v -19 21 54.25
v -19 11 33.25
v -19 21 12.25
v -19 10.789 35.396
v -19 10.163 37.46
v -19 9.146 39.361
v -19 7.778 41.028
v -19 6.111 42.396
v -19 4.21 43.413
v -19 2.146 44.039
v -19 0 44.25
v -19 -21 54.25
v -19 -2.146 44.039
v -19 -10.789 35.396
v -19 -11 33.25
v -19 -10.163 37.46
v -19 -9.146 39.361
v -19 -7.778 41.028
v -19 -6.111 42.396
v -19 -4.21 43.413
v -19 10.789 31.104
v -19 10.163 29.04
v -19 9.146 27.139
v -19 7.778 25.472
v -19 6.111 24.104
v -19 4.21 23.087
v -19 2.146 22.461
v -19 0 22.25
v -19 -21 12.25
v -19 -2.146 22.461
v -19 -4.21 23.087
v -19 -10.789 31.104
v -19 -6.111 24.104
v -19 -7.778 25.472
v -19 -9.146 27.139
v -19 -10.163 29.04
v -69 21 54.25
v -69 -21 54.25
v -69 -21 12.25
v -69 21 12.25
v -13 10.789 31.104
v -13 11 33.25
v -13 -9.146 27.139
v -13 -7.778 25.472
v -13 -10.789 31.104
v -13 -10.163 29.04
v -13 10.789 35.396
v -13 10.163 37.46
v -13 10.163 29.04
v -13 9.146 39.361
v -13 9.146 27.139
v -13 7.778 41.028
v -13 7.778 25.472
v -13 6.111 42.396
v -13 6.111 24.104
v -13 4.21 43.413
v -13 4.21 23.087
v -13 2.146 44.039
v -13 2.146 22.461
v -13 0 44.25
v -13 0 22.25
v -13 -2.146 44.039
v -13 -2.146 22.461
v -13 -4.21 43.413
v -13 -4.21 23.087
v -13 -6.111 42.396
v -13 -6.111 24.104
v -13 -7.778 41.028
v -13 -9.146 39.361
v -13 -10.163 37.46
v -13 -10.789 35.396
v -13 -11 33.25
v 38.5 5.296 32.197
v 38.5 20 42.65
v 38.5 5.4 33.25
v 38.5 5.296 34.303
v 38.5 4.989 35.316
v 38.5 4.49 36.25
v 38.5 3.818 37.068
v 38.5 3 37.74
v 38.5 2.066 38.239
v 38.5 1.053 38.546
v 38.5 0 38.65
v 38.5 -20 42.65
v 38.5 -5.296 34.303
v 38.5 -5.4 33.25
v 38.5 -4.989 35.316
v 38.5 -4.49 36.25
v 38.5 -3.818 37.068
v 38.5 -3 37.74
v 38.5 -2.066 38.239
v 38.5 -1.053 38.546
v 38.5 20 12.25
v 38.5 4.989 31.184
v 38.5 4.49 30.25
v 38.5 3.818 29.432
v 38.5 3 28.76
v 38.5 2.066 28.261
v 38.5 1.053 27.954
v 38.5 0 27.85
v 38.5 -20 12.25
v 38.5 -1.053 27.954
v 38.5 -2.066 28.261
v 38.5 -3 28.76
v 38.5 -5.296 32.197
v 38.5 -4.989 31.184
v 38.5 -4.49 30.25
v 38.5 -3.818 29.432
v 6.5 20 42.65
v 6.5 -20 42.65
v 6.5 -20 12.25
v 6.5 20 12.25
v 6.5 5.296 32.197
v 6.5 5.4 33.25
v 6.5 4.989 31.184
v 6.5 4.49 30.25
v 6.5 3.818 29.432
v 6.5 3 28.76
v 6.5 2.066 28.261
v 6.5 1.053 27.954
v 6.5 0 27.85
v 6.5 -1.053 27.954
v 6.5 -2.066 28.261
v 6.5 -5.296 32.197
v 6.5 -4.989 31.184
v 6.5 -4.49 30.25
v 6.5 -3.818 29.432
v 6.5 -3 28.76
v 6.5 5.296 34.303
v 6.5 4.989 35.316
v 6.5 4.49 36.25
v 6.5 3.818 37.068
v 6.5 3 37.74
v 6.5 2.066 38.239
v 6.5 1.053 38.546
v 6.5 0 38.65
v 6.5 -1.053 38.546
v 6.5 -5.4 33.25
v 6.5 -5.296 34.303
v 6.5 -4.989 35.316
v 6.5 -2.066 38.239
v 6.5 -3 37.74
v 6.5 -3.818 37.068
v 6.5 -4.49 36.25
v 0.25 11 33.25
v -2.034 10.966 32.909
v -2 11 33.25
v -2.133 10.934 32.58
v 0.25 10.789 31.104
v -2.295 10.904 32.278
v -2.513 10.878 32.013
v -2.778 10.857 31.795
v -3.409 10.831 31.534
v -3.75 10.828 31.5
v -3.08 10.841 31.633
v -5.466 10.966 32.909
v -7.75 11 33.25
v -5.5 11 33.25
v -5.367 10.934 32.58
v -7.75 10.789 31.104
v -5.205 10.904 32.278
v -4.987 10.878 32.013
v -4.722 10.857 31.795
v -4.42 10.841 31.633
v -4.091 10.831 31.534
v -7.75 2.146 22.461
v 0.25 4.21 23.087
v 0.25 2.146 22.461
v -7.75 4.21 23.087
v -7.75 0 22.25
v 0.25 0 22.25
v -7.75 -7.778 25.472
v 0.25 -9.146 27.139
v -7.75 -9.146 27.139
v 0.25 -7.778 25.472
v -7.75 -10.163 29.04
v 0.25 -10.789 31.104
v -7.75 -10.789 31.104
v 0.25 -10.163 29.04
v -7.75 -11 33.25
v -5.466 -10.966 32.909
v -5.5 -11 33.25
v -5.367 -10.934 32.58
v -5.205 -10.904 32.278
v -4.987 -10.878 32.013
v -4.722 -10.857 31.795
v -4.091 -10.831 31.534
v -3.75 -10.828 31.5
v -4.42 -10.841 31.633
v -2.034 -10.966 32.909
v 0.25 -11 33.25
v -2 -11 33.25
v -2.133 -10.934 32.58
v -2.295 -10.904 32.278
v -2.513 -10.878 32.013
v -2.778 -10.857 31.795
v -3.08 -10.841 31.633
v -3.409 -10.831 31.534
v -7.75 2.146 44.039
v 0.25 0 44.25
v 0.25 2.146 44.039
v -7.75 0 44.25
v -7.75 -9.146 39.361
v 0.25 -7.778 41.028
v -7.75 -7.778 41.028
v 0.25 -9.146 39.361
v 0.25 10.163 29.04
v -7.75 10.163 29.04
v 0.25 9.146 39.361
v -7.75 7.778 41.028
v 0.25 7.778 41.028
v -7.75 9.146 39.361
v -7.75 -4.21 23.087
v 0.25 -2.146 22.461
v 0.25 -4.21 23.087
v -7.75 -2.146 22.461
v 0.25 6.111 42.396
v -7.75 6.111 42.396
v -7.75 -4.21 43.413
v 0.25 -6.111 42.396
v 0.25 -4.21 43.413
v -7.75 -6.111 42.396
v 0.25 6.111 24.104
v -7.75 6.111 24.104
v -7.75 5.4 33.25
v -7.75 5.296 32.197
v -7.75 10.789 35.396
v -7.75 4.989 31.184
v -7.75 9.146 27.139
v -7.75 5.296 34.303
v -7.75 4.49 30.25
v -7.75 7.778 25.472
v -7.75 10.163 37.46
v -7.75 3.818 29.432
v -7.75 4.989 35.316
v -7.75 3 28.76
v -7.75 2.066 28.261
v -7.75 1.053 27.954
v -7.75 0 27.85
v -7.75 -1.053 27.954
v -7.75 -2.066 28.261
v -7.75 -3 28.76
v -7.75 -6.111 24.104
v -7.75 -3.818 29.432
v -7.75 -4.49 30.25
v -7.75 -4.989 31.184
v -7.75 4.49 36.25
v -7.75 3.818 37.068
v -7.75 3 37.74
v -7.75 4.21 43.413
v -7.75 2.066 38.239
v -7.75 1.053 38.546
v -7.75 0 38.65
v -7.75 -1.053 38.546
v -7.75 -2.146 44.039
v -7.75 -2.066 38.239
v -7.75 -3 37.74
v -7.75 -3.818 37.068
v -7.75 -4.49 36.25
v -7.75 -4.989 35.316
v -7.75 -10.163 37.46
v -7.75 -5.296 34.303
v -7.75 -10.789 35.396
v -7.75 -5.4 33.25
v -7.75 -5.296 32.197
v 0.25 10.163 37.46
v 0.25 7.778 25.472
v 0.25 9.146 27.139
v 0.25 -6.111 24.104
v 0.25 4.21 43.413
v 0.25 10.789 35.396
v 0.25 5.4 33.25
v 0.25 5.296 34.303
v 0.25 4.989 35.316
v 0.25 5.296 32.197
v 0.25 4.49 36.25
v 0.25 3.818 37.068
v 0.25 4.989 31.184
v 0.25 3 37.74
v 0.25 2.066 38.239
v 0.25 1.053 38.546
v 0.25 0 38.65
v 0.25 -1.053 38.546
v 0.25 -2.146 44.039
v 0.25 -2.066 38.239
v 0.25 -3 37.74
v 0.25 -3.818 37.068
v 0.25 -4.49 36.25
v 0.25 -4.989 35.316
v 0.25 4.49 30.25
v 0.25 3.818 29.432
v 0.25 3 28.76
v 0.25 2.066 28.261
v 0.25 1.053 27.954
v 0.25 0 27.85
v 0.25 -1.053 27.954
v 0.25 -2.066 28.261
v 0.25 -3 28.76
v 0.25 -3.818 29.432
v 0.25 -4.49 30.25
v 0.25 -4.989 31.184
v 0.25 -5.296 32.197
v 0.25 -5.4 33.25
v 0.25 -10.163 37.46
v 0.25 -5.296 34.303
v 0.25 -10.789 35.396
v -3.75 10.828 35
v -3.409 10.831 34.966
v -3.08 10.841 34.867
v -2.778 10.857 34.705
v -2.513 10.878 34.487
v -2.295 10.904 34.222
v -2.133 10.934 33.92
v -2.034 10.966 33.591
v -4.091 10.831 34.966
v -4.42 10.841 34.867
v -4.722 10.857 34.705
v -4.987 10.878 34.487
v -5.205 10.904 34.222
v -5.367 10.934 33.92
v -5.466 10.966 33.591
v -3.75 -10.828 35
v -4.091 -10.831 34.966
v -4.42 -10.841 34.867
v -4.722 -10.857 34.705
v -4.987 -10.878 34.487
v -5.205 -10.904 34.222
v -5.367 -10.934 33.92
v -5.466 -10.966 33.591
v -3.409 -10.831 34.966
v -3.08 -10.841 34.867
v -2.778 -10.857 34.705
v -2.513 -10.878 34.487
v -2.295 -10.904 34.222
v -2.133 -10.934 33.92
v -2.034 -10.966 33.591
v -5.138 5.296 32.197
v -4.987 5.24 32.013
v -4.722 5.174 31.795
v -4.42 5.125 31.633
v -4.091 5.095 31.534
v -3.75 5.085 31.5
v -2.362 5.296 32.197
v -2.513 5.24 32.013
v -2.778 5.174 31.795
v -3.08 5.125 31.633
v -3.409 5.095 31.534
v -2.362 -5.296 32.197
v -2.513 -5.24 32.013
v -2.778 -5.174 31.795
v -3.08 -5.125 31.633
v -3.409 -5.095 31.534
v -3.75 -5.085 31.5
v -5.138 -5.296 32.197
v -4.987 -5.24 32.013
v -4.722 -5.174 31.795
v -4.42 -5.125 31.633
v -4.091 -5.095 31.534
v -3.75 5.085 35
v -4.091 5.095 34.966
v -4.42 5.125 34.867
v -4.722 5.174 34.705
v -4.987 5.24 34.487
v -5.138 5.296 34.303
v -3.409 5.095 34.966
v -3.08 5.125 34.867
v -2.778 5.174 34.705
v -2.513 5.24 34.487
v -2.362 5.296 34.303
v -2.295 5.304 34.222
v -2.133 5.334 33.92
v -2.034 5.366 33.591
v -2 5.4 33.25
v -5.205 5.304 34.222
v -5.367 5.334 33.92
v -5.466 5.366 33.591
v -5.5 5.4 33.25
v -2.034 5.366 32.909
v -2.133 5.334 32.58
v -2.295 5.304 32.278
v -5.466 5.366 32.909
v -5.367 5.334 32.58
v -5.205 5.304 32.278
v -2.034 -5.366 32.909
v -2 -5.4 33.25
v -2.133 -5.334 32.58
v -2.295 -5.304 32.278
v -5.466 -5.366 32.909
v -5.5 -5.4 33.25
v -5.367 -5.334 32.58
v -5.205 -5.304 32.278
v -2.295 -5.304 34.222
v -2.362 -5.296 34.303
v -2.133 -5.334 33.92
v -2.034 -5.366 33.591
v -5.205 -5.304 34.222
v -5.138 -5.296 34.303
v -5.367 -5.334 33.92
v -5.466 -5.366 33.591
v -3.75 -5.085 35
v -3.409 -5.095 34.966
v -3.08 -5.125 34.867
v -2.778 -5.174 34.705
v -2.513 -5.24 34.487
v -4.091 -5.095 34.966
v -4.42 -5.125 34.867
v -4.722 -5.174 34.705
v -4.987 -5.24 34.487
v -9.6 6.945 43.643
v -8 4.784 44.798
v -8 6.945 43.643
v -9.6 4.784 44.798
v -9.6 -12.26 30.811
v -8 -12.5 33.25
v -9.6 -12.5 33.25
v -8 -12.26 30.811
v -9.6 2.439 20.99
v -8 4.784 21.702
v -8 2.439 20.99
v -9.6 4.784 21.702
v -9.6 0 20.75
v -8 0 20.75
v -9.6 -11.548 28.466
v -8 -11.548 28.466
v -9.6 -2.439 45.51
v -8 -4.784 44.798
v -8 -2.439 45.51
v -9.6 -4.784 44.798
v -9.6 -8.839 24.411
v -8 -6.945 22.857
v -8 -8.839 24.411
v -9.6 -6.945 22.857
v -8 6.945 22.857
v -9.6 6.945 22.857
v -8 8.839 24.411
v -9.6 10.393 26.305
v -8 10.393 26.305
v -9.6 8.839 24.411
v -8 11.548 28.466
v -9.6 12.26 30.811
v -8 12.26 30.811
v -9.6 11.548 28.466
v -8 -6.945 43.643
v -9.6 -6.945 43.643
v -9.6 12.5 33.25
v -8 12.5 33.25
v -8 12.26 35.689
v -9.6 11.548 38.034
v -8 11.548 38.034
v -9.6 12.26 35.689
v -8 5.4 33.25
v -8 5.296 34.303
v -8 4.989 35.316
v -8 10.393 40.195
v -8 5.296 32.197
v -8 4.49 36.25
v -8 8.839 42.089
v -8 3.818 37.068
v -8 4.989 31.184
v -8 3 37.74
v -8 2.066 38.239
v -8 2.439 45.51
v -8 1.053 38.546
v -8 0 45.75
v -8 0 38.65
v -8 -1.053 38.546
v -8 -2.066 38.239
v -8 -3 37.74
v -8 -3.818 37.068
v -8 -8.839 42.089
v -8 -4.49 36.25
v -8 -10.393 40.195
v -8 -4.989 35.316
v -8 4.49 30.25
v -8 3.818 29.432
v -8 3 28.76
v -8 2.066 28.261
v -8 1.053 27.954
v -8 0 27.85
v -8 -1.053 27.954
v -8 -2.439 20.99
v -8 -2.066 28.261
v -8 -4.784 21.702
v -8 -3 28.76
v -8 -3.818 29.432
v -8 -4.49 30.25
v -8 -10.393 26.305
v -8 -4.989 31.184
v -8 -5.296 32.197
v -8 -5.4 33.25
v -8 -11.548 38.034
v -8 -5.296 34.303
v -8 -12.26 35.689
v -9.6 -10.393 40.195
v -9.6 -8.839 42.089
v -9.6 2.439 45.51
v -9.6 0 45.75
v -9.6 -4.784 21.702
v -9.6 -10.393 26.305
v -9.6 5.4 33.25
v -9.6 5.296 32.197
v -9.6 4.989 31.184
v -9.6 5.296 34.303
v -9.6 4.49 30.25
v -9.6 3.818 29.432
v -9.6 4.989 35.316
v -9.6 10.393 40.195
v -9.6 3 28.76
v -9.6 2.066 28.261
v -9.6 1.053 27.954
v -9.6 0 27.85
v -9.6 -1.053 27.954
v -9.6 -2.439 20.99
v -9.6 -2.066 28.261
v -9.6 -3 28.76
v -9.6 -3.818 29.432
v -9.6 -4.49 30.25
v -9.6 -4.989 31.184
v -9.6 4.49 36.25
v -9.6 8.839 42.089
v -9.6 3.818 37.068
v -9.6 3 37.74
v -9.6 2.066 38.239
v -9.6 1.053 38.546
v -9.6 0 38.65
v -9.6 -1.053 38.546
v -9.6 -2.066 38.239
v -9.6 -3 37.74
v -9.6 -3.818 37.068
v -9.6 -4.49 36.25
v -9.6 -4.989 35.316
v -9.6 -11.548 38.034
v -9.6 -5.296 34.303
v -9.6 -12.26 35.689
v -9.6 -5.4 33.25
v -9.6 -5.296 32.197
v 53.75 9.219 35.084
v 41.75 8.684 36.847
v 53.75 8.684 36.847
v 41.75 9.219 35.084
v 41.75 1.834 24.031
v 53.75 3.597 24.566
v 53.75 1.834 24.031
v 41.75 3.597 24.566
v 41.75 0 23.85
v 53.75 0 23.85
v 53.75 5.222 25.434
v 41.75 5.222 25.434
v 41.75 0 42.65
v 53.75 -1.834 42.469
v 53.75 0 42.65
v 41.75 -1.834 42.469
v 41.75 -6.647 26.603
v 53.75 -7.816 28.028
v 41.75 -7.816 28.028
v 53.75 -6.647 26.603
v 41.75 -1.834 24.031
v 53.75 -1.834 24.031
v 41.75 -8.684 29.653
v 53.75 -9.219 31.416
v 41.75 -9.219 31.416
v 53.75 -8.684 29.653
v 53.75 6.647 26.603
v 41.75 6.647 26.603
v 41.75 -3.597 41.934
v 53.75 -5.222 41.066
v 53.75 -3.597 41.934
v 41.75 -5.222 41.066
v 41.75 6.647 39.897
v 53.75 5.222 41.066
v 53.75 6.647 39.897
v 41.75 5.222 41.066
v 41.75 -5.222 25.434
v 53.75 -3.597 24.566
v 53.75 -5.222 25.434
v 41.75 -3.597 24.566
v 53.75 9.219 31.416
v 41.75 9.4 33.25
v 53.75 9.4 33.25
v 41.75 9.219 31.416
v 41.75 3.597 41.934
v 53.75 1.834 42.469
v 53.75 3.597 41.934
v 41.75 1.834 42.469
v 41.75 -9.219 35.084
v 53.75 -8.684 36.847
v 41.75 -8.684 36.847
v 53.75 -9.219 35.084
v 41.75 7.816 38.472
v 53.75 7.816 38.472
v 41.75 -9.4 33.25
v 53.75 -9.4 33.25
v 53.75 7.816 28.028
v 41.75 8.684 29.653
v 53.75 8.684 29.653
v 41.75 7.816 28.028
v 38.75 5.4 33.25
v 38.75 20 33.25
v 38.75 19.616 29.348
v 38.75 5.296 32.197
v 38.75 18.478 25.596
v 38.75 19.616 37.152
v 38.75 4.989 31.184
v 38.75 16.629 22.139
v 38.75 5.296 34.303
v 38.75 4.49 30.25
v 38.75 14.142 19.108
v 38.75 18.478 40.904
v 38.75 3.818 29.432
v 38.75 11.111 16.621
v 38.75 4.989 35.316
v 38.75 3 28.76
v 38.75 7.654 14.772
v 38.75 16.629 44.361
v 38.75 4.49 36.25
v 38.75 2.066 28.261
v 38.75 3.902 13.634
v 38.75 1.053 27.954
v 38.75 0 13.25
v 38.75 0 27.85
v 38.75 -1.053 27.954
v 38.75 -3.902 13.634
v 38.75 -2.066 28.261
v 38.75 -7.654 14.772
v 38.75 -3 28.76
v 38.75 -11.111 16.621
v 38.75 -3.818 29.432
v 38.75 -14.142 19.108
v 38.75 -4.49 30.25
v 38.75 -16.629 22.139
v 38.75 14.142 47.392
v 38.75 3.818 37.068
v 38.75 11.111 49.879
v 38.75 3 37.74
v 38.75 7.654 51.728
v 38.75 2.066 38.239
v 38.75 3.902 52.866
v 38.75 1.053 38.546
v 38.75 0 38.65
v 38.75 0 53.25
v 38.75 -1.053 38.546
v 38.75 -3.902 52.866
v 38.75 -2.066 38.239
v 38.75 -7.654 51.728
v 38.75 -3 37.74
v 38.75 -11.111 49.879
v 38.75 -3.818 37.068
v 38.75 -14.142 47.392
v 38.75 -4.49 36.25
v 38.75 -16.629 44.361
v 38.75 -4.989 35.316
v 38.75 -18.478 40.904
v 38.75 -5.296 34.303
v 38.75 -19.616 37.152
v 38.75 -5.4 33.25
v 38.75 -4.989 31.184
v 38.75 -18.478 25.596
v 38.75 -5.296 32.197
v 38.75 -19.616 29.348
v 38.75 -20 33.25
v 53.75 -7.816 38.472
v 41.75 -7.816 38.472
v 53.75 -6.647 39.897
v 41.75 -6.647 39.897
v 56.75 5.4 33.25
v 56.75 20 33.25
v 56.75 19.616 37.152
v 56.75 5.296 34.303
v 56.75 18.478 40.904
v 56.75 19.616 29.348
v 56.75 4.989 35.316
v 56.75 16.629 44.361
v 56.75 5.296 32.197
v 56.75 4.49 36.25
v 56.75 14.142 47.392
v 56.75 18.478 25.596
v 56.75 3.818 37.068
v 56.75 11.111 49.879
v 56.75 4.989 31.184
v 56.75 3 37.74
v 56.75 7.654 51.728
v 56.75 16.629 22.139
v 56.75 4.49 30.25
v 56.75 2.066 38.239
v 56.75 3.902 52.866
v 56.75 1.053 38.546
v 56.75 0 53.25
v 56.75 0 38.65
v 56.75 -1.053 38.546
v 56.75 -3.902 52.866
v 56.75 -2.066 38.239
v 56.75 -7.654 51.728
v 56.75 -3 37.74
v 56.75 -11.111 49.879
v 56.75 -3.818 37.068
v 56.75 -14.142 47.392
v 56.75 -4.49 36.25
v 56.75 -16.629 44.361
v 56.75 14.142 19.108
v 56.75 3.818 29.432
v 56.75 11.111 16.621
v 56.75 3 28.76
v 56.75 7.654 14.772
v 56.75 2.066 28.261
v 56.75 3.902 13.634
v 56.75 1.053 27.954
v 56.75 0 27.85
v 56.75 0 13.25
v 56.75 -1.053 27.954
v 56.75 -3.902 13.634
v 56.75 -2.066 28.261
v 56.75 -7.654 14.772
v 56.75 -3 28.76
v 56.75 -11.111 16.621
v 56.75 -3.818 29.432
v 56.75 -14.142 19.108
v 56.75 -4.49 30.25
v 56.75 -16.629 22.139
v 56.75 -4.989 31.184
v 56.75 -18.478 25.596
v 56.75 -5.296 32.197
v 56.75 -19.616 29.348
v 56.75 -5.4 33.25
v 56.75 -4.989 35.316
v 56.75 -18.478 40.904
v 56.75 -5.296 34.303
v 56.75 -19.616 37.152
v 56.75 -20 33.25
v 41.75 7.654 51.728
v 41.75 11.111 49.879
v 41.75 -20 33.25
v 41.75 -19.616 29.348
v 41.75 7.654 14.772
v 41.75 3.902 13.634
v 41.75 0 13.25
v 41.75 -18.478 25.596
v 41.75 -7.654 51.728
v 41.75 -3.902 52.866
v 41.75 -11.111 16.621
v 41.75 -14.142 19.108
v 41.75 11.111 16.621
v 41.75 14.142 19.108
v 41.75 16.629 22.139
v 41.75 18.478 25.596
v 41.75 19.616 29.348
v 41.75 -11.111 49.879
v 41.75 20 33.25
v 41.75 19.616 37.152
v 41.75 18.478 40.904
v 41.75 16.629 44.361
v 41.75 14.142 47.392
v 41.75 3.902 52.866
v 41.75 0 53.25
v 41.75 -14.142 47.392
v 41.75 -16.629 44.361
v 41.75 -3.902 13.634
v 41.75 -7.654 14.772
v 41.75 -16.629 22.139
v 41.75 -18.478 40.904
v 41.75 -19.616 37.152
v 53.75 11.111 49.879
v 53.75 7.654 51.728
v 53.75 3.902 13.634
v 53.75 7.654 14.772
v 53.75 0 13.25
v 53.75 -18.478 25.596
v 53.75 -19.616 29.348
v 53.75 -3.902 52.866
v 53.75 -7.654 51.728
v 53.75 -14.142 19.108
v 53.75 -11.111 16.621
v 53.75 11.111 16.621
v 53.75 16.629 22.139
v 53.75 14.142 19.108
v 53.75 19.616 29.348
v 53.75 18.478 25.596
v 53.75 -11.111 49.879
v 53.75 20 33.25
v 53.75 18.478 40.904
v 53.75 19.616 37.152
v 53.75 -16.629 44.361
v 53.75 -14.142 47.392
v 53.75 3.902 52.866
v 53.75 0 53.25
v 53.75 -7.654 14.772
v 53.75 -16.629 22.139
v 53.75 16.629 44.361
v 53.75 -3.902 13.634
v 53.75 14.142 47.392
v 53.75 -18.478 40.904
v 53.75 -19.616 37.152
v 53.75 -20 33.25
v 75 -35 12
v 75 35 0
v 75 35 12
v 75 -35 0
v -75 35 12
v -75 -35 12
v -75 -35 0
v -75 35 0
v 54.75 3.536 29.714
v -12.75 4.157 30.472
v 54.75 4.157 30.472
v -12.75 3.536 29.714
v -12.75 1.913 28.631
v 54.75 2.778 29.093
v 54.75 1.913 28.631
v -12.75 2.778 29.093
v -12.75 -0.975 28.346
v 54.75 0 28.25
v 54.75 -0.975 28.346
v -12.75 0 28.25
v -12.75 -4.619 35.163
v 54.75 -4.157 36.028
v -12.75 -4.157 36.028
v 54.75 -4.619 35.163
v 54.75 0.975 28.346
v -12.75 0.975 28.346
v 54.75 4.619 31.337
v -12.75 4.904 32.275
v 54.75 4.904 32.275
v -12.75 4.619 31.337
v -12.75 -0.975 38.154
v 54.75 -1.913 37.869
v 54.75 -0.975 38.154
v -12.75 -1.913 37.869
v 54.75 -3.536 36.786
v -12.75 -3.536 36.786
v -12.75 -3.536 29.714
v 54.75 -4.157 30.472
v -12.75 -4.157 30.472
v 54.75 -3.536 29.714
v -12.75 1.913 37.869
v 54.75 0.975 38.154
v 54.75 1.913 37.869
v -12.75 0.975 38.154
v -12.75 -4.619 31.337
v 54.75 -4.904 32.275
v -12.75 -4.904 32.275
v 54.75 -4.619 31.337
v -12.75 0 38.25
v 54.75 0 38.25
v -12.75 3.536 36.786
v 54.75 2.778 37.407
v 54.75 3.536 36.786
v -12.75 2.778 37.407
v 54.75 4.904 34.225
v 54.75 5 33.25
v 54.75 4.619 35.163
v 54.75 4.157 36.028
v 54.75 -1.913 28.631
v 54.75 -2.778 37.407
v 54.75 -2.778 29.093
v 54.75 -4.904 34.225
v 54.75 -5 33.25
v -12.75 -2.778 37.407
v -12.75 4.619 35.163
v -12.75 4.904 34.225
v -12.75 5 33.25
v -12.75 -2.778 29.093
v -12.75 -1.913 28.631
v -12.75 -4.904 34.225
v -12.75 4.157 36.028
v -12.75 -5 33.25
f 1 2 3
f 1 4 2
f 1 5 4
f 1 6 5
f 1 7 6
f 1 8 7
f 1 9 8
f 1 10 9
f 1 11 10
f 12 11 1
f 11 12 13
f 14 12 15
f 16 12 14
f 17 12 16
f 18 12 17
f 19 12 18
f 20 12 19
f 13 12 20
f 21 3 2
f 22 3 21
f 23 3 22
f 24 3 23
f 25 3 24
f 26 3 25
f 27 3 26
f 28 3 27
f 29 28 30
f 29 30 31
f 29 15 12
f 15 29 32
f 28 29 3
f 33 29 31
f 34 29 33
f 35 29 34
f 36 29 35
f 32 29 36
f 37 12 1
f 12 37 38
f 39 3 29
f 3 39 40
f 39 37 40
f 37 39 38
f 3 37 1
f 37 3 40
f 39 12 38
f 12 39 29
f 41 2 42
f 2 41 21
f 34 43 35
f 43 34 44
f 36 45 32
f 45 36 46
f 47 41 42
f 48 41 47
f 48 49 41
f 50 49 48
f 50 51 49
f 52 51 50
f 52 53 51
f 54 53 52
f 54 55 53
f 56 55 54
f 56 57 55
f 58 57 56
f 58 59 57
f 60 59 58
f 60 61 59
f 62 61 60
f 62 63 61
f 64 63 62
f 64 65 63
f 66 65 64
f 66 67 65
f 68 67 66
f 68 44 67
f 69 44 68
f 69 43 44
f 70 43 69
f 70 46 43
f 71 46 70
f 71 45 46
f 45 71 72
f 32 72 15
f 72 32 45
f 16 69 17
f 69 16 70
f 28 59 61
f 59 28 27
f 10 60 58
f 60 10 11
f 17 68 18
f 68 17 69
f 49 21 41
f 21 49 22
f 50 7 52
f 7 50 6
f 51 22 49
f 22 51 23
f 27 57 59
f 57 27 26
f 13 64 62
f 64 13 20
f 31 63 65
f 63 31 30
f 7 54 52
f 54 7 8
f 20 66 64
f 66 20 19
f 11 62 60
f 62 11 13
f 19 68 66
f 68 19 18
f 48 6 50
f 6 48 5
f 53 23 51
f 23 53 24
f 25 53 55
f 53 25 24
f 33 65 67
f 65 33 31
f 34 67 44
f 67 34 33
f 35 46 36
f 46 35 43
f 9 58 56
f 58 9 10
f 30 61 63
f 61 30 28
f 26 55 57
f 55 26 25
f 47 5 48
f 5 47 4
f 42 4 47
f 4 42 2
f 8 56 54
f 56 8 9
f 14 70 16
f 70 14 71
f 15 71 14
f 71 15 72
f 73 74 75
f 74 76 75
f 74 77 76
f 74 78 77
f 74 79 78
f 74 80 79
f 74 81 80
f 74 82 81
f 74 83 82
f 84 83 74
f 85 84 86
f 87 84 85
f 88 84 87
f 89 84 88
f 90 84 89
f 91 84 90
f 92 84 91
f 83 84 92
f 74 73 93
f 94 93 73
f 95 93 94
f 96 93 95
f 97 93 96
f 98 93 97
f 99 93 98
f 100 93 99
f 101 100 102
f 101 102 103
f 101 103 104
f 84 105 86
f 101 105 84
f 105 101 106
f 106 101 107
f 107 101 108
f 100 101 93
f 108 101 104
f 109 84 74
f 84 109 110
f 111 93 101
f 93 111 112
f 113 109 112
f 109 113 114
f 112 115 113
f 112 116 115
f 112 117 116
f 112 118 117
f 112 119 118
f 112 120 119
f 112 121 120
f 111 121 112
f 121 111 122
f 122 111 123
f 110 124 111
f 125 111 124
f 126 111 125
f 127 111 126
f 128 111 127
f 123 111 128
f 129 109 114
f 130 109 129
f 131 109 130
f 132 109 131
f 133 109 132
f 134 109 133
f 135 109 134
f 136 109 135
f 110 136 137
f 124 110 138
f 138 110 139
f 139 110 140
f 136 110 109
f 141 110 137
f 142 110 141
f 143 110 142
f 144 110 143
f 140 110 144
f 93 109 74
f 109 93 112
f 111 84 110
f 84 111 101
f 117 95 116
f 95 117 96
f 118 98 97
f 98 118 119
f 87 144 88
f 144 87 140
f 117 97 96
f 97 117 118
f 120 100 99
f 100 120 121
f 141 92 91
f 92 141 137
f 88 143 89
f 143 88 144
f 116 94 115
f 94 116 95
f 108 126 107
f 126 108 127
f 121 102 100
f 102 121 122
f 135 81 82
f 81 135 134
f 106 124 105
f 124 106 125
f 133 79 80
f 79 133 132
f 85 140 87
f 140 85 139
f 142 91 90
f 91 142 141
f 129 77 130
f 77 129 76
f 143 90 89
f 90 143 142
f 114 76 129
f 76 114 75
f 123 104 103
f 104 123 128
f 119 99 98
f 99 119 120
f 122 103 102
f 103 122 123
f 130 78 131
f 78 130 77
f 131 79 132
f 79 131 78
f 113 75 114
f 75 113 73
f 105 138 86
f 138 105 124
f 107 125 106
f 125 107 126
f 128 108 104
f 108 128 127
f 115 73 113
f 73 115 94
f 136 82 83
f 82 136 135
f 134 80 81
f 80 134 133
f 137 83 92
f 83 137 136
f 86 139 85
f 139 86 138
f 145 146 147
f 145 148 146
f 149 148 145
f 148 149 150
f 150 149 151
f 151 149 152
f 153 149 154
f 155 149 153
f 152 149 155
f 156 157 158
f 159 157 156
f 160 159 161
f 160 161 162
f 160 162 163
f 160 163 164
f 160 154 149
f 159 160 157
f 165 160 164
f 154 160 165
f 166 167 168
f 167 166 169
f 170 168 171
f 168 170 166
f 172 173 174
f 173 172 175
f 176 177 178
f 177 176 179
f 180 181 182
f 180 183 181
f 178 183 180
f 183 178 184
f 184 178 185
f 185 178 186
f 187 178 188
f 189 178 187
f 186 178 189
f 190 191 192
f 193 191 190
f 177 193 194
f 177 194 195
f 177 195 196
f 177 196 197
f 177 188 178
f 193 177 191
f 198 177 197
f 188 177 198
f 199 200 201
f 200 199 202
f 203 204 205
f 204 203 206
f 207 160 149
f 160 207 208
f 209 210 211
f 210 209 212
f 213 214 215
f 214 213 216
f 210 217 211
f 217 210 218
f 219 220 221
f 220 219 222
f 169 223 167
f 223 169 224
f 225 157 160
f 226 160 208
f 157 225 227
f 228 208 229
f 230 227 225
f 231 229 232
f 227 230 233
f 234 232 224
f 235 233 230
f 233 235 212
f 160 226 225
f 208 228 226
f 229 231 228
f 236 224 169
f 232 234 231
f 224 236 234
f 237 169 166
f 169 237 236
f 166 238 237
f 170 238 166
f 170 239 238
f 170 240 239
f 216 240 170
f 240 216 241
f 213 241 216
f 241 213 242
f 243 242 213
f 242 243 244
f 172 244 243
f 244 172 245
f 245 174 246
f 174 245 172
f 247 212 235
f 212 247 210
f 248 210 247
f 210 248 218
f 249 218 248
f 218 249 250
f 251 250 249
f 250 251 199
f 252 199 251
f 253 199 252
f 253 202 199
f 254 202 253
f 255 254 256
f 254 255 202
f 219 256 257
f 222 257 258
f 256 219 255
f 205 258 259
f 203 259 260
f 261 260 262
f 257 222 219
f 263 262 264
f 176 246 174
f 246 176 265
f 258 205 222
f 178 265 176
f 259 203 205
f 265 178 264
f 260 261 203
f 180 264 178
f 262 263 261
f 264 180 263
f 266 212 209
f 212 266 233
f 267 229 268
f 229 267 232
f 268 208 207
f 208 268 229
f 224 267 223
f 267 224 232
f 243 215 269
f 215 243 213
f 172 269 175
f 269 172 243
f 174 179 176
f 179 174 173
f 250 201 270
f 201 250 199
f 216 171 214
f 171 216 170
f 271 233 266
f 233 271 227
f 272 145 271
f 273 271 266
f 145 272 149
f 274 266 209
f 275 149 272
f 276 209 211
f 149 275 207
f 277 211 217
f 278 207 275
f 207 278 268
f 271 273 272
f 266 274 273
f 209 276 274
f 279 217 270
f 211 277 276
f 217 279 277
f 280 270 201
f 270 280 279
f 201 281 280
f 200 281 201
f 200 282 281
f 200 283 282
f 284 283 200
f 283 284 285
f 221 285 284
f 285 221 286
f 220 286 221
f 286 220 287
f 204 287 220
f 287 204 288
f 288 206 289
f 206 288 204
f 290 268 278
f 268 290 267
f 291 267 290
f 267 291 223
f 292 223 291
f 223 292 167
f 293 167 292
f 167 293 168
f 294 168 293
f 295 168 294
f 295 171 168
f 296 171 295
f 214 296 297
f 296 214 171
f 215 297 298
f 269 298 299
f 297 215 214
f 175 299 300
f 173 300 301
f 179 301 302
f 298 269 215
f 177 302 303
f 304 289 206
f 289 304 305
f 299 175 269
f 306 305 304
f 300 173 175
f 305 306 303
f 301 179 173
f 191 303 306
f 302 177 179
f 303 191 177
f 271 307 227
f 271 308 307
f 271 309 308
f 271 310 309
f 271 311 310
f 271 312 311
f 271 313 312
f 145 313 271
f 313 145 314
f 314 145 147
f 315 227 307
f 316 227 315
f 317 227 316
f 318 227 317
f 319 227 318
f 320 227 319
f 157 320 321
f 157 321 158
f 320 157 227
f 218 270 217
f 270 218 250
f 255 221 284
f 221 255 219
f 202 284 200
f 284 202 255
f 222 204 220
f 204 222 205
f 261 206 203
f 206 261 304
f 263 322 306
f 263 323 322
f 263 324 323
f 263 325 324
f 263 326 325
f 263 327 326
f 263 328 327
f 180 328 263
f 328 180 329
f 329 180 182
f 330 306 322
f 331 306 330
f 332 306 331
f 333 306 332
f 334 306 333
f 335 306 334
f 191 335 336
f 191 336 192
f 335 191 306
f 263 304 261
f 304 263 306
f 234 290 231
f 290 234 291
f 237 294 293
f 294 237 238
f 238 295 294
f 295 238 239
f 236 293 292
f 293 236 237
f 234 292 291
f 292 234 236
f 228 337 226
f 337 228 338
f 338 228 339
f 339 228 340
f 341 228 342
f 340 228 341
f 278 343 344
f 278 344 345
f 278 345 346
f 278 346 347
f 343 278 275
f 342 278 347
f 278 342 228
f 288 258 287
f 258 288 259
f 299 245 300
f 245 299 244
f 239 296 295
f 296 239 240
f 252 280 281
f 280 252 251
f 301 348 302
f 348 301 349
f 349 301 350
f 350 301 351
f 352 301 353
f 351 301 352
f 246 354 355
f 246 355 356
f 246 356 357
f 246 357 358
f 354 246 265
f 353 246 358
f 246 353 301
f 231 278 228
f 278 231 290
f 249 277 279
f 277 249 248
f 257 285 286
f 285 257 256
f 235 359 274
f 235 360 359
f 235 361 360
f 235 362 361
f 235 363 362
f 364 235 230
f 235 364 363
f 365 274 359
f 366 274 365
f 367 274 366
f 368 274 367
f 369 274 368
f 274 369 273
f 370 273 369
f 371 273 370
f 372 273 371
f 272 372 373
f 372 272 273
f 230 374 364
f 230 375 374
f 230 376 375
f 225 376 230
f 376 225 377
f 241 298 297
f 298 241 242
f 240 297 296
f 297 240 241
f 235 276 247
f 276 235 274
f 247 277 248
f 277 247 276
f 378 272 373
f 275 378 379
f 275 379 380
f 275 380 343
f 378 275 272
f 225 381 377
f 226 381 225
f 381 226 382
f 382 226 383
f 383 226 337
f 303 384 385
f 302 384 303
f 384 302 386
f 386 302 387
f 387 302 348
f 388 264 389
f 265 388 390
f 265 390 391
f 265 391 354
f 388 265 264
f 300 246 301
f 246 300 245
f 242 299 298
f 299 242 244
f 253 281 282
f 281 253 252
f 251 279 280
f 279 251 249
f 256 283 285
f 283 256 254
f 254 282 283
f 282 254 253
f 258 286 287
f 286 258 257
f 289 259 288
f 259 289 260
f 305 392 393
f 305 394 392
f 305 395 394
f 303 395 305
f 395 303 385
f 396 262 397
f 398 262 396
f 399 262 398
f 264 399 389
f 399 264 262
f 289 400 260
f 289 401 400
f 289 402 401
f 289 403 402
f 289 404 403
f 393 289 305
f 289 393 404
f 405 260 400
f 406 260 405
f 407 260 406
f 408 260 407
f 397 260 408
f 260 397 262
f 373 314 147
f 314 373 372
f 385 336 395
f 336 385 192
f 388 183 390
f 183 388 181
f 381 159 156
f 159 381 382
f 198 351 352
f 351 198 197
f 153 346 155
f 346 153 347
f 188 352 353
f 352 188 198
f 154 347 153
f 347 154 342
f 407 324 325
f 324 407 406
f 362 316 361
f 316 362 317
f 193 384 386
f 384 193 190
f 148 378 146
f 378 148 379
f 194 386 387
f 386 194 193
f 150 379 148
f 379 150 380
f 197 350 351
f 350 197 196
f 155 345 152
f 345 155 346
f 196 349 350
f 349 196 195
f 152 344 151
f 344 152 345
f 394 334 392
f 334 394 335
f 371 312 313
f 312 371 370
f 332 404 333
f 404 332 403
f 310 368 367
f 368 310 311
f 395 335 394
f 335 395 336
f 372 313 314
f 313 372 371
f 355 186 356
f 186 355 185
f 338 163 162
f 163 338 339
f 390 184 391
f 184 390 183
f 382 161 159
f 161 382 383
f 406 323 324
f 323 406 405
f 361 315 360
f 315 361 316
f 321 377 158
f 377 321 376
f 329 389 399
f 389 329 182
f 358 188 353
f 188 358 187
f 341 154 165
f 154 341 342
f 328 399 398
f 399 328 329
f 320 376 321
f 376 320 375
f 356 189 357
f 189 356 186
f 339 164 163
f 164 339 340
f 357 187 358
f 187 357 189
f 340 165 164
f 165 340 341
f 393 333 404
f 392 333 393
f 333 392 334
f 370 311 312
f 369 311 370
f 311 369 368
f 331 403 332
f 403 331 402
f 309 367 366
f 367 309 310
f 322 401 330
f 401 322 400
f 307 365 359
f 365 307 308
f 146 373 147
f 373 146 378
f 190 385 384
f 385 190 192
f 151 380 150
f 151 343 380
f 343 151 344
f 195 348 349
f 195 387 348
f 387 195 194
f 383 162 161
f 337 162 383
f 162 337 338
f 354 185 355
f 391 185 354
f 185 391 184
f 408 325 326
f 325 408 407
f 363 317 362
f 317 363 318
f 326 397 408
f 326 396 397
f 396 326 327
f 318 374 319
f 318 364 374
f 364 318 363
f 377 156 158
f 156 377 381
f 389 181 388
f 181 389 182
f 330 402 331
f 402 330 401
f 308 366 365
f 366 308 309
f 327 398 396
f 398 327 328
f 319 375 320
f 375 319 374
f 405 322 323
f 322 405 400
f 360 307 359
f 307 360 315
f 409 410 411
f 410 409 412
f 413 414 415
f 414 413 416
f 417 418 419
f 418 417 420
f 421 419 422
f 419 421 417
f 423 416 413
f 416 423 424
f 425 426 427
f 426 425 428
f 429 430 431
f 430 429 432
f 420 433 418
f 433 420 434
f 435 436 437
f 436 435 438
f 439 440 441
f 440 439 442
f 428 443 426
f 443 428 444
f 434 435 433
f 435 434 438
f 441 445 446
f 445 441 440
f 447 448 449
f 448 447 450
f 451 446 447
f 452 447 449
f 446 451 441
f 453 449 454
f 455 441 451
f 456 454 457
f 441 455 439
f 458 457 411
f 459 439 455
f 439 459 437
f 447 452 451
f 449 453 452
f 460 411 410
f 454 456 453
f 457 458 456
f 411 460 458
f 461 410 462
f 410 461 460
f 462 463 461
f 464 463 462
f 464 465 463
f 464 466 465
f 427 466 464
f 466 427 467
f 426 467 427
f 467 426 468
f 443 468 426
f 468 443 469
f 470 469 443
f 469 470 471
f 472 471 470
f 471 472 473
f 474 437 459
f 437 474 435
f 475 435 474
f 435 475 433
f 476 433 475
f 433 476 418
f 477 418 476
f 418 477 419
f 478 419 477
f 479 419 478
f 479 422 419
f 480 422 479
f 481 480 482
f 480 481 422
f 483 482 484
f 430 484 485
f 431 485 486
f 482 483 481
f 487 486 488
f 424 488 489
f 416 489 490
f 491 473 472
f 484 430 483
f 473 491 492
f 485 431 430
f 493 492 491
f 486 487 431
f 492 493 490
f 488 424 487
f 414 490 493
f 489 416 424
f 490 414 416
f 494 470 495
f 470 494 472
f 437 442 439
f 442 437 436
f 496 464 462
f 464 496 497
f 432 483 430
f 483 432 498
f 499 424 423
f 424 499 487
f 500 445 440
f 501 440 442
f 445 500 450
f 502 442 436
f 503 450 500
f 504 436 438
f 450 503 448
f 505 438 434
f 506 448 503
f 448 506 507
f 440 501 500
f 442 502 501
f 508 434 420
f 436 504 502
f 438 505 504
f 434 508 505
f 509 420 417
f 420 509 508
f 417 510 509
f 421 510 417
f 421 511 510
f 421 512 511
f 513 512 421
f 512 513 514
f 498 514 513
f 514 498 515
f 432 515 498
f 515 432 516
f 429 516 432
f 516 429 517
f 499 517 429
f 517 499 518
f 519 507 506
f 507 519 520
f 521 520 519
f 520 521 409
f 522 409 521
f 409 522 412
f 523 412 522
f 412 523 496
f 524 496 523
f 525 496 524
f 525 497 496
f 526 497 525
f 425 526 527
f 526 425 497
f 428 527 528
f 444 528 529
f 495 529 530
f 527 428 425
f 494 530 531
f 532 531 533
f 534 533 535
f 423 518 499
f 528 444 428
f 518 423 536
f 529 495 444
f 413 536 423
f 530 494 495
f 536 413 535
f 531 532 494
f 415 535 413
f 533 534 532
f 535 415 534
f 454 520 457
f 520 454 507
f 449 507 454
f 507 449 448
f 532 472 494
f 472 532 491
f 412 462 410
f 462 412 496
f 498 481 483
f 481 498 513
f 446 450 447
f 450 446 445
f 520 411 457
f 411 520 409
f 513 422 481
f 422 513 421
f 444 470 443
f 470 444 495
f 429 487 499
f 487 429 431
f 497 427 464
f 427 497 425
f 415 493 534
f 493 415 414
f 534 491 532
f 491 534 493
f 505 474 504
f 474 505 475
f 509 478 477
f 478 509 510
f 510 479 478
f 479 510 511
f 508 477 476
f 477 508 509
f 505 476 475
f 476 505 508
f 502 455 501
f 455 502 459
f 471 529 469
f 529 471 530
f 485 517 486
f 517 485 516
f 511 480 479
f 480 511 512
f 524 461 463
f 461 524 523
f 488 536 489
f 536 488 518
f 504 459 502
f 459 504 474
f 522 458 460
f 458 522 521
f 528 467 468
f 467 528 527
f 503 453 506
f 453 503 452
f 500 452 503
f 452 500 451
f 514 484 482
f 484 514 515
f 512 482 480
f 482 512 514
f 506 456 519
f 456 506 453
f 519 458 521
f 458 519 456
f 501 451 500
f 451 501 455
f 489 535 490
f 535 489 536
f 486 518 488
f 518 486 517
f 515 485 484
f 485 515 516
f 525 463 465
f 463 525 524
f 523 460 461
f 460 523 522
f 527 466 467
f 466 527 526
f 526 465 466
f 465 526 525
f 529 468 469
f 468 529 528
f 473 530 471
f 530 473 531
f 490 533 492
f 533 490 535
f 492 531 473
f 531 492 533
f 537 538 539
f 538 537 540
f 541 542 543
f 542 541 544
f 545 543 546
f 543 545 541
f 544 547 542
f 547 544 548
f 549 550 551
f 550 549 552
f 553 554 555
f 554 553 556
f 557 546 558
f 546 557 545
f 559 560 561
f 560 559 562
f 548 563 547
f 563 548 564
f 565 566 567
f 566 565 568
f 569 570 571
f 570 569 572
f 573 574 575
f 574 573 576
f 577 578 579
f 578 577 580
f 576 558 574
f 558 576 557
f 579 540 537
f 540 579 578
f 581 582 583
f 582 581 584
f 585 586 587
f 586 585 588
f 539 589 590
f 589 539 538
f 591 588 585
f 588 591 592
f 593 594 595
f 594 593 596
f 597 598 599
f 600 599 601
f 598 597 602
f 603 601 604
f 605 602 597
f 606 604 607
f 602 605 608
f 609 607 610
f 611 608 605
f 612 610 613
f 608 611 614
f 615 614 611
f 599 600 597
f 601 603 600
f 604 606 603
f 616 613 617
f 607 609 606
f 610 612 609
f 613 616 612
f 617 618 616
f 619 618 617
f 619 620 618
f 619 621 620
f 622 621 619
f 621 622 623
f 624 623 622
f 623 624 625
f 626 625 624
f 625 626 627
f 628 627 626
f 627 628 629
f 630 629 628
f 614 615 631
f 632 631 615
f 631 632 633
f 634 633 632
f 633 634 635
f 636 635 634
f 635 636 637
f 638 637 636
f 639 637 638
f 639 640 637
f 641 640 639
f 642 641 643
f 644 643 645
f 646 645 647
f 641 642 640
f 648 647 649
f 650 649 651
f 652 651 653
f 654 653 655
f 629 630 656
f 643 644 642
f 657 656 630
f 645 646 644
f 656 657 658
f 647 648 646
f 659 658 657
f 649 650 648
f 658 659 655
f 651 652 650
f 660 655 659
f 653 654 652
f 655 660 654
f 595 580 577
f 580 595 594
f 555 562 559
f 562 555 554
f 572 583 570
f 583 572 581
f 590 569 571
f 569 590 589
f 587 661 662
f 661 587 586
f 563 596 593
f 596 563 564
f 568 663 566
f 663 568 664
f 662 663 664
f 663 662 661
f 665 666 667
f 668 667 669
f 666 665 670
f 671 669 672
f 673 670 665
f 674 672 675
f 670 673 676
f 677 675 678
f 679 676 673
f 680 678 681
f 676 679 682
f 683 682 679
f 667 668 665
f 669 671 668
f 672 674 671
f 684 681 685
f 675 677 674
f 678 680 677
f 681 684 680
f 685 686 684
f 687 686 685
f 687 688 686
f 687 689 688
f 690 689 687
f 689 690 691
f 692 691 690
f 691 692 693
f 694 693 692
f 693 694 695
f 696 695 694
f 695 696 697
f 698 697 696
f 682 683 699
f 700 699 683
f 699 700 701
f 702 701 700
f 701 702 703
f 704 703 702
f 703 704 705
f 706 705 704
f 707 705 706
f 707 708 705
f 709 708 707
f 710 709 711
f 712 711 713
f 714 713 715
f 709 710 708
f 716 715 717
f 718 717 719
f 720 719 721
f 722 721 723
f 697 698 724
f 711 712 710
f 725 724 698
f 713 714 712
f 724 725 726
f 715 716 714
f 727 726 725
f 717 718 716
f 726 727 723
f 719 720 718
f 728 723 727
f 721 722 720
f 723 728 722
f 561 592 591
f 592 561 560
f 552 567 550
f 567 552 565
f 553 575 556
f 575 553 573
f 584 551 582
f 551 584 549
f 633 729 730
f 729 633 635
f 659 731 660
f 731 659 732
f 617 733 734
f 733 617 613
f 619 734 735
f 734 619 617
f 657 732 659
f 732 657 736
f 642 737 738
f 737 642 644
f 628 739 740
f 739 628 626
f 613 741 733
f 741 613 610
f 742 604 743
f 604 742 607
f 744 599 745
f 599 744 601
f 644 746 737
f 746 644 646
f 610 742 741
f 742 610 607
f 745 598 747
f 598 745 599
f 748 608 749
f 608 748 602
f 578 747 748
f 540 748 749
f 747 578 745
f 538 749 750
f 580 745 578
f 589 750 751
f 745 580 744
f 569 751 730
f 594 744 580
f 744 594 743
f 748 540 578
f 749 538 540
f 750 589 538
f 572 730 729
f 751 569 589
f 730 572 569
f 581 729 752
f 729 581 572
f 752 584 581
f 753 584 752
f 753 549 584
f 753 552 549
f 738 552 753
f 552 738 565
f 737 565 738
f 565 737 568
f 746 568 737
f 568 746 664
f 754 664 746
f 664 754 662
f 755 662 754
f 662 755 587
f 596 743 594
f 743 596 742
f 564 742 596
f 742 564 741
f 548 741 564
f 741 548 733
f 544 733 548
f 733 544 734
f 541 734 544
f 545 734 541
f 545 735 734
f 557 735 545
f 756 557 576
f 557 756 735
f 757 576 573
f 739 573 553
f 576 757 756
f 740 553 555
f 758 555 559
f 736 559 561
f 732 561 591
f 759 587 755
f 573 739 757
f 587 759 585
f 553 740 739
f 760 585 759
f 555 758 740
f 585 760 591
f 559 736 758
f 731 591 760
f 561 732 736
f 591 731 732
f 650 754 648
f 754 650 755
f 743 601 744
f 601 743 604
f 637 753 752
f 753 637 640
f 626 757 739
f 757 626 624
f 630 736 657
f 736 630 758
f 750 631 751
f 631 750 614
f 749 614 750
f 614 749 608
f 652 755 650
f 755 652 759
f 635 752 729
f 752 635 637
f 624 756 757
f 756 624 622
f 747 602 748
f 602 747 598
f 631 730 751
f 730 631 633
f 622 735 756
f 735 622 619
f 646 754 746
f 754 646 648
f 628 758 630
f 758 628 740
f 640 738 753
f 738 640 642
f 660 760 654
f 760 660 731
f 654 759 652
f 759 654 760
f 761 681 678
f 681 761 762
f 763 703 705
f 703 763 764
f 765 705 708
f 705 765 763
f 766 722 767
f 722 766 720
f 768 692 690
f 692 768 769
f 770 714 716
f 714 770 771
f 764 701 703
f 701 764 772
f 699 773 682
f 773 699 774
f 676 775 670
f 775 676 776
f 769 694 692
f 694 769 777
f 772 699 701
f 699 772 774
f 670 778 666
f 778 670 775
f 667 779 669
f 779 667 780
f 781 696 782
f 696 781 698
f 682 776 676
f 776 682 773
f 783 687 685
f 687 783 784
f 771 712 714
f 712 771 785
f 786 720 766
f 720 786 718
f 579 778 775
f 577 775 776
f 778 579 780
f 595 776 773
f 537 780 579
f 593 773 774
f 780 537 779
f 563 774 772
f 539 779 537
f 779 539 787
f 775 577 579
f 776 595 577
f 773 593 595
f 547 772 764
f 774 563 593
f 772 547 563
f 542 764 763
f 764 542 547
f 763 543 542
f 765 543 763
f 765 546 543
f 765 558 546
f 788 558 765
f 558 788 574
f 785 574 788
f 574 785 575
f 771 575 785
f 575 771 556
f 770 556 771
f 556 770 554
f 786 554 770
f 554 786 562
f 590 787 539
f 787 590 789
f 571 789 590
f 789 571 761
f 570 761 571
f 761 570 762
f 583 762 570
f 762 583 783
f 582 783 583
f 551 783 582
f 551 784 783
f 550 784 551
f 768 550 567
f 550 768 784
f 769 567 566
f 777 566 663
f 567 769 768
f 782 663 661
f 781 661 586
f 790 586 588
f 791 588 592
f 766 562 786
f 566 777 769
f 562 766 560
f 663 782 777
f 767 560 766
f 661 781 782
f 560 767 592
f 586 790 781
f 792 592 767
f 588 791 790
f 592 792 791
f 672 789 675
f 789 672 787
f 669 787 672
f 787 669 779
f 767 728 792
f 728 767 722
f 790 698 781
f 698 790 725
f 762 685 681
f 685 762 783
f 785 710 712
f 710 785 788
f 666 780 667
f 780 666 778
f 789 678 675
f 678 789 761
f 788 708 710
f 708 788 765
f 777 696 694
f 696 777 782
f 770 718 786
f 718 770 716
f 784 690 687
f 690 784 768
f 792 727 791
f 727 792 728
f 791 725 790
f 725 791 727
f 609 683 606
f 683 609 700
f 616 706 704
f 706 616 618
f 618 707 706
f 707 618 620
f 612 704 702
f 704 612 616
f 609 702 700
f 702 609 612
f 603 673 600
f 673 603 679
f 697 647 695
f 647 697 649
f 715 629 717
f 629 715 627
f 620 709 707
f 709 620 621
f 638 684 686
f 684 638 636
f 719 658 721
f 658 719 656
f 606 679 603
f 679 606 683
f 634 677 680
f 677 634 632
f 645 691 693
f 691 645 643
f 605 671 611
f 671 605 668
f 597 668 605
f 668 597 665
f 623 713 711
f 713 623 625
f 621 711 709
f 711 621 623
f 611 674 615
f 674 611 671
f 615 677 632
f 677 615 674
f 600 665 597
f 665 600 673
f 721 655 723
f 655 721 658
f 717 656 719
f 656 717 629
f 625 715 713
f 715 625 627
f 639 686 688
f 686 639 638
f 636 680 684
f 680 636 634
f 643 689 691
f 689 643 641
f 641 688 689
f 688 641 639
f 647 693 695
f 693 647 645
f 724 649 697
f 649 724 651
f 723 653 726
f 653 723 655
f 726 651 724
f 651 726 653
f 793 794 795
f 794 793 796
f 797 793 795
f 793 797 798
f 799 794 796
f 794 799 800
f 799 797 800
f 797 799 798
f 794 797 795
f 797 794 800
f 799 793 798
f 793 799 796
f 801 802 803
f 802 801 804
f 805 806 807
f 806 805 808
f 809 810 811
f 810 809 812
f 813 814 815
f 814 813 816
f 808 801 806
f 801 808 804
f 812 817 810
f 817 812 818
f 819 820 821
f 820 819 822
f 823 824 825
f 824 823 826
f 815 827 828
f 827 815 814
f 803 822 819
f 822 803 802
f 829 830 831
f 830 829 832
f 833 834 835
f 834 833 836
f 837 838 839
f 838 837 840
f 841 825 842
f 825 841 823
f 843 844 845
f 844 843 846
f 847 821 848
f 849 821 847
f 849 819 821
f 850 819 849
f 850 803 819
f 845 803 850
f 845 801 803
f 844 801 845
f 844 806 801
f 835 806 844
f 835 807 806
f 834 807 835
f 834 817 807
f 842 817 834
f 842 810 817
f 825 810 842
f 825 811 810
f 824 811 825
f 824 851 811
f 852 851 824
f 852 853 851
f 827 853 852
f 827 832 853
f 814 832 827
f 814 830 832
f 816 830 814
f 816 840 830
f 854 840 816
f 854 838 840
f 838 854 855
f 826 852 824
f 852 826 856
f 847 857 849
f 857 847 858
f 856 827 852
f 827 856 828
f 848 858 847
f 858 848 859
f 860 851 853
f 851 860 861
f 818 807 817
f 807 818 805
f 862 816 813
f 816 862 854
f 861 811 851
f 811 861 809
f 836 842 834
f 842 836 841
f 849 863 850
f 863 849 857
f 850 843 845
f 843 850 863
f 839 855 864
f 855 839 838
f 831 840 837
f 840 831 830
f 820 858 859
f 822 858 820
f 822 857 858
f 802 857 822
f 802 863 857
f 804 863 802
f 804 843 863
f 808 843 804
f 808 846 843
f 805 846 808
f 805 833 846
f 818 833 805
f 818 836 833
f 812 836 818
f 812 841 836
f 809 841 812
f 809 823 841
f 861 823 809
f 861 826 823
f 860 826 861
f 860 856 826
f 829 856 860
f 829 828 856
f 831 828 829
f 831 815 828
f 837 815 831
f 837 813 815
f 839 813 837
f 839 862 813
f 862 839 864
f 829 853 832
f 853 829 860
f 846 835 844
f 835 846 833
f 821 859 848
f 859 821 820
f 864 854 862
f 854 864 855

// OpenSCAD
$fn = 32;

// ------------------------------------------------------------------------
// Motor drive station: motor 50 x 42 mm, shaft d10, pulley d40
// Every part is its own module, assembly() places every instance.
// ------------------------------------------------------------------------

// --- part 1 ---
module station_bed() {
  difference() {
    translate([-75, -35, 0]) cube([150, 70, 12]);
  }
}

// --- part 2 ---
module drive_motor() {
  union() {
    translate([-25, -21, 0]) cube([50, 42, 42]);
    translate([28, 0, 21]) rotate([0, 90, 0]) cylinder(h = 6, d = 22, center = true);
  }
}

// --- part 3 ---
module pillow_block() {
  difference() {
    translate([-16, -20, 0]) cube([32, 40, 30.4]);
    translate([0, 0, 21]) rotate([0, 90, 0]) cylinder(h = 34, d = 10.8, center = true);
  }
}

// --- part 4 ---
module drive_shaft() {
  translate([0, 0, -33.75]) cylinder(h = 67.5, d = 10);
}

// --- part 5 ---
module shaft_collar() {
  difference() {
    cylinder(h = 8, d = 22);
    translate([0, 0, -1]) cylinder(h = 10, d = 10.8);
    translate([0, 0, 4]) rotate([90, 0, 0]) cylinder(h = 24, d = 3.5, center = true);
  }
}

// --- part 6 ---
module collar_washer() {
  difference() {
      translate([0, 0, 0]) cylinder(h = 1.6, d = 25);
      translate([0, 0, -1]) cylinder(h = 3.6, d = 10.8);
    }
}

// --- part 7 ---
module drive_pulley() {
  difference() {
    union() {
      cylinder(h = 18, d = 18.8);
      cylinder(h = 3, d = 40);
      translate([0, 0, 15]) cylinder(h = 3, d = 40);
    }
    translate([0, 0, -1]) cylinder(h = 20, d = 10.8);
  }
}

// --- assembly ---
module assembly() {
  color([0.80, 0.24, 0.20]) translate([0, 0, 0]) rotate([0, 0, 0]) station_bed();
  color([0.20, 0.45, 0.75]) translate([-44, 0, 12.25]) rotate([0, 0, 0]) drive_motor();
  color([0.25, 0.62, 0.32]) translate([22.5, 0, 12.25]) rotate([0, 0, 0]) pillow_block();
  color([0.92, 0.70, 0.18]) translate([21, 0, 33.25]) rotate([0, 90, 0]) drive_shaft();
  color([0.58, 0.35, 0.70]) translate([-7.75, 0, 33.25]) rotate([0, 90, 0]) shaft_collar();
  color([0.16, 0.66, 0.66]) translate([-9.6, 0, 33.25]) rotate([0, 90, 0]) collar_washer();
  color([0.85, 0.48, 0.18]) translate([38.75, 0, 33.25]) rotate([0, 90, 0]) drive_pulley();
}

assembly();
